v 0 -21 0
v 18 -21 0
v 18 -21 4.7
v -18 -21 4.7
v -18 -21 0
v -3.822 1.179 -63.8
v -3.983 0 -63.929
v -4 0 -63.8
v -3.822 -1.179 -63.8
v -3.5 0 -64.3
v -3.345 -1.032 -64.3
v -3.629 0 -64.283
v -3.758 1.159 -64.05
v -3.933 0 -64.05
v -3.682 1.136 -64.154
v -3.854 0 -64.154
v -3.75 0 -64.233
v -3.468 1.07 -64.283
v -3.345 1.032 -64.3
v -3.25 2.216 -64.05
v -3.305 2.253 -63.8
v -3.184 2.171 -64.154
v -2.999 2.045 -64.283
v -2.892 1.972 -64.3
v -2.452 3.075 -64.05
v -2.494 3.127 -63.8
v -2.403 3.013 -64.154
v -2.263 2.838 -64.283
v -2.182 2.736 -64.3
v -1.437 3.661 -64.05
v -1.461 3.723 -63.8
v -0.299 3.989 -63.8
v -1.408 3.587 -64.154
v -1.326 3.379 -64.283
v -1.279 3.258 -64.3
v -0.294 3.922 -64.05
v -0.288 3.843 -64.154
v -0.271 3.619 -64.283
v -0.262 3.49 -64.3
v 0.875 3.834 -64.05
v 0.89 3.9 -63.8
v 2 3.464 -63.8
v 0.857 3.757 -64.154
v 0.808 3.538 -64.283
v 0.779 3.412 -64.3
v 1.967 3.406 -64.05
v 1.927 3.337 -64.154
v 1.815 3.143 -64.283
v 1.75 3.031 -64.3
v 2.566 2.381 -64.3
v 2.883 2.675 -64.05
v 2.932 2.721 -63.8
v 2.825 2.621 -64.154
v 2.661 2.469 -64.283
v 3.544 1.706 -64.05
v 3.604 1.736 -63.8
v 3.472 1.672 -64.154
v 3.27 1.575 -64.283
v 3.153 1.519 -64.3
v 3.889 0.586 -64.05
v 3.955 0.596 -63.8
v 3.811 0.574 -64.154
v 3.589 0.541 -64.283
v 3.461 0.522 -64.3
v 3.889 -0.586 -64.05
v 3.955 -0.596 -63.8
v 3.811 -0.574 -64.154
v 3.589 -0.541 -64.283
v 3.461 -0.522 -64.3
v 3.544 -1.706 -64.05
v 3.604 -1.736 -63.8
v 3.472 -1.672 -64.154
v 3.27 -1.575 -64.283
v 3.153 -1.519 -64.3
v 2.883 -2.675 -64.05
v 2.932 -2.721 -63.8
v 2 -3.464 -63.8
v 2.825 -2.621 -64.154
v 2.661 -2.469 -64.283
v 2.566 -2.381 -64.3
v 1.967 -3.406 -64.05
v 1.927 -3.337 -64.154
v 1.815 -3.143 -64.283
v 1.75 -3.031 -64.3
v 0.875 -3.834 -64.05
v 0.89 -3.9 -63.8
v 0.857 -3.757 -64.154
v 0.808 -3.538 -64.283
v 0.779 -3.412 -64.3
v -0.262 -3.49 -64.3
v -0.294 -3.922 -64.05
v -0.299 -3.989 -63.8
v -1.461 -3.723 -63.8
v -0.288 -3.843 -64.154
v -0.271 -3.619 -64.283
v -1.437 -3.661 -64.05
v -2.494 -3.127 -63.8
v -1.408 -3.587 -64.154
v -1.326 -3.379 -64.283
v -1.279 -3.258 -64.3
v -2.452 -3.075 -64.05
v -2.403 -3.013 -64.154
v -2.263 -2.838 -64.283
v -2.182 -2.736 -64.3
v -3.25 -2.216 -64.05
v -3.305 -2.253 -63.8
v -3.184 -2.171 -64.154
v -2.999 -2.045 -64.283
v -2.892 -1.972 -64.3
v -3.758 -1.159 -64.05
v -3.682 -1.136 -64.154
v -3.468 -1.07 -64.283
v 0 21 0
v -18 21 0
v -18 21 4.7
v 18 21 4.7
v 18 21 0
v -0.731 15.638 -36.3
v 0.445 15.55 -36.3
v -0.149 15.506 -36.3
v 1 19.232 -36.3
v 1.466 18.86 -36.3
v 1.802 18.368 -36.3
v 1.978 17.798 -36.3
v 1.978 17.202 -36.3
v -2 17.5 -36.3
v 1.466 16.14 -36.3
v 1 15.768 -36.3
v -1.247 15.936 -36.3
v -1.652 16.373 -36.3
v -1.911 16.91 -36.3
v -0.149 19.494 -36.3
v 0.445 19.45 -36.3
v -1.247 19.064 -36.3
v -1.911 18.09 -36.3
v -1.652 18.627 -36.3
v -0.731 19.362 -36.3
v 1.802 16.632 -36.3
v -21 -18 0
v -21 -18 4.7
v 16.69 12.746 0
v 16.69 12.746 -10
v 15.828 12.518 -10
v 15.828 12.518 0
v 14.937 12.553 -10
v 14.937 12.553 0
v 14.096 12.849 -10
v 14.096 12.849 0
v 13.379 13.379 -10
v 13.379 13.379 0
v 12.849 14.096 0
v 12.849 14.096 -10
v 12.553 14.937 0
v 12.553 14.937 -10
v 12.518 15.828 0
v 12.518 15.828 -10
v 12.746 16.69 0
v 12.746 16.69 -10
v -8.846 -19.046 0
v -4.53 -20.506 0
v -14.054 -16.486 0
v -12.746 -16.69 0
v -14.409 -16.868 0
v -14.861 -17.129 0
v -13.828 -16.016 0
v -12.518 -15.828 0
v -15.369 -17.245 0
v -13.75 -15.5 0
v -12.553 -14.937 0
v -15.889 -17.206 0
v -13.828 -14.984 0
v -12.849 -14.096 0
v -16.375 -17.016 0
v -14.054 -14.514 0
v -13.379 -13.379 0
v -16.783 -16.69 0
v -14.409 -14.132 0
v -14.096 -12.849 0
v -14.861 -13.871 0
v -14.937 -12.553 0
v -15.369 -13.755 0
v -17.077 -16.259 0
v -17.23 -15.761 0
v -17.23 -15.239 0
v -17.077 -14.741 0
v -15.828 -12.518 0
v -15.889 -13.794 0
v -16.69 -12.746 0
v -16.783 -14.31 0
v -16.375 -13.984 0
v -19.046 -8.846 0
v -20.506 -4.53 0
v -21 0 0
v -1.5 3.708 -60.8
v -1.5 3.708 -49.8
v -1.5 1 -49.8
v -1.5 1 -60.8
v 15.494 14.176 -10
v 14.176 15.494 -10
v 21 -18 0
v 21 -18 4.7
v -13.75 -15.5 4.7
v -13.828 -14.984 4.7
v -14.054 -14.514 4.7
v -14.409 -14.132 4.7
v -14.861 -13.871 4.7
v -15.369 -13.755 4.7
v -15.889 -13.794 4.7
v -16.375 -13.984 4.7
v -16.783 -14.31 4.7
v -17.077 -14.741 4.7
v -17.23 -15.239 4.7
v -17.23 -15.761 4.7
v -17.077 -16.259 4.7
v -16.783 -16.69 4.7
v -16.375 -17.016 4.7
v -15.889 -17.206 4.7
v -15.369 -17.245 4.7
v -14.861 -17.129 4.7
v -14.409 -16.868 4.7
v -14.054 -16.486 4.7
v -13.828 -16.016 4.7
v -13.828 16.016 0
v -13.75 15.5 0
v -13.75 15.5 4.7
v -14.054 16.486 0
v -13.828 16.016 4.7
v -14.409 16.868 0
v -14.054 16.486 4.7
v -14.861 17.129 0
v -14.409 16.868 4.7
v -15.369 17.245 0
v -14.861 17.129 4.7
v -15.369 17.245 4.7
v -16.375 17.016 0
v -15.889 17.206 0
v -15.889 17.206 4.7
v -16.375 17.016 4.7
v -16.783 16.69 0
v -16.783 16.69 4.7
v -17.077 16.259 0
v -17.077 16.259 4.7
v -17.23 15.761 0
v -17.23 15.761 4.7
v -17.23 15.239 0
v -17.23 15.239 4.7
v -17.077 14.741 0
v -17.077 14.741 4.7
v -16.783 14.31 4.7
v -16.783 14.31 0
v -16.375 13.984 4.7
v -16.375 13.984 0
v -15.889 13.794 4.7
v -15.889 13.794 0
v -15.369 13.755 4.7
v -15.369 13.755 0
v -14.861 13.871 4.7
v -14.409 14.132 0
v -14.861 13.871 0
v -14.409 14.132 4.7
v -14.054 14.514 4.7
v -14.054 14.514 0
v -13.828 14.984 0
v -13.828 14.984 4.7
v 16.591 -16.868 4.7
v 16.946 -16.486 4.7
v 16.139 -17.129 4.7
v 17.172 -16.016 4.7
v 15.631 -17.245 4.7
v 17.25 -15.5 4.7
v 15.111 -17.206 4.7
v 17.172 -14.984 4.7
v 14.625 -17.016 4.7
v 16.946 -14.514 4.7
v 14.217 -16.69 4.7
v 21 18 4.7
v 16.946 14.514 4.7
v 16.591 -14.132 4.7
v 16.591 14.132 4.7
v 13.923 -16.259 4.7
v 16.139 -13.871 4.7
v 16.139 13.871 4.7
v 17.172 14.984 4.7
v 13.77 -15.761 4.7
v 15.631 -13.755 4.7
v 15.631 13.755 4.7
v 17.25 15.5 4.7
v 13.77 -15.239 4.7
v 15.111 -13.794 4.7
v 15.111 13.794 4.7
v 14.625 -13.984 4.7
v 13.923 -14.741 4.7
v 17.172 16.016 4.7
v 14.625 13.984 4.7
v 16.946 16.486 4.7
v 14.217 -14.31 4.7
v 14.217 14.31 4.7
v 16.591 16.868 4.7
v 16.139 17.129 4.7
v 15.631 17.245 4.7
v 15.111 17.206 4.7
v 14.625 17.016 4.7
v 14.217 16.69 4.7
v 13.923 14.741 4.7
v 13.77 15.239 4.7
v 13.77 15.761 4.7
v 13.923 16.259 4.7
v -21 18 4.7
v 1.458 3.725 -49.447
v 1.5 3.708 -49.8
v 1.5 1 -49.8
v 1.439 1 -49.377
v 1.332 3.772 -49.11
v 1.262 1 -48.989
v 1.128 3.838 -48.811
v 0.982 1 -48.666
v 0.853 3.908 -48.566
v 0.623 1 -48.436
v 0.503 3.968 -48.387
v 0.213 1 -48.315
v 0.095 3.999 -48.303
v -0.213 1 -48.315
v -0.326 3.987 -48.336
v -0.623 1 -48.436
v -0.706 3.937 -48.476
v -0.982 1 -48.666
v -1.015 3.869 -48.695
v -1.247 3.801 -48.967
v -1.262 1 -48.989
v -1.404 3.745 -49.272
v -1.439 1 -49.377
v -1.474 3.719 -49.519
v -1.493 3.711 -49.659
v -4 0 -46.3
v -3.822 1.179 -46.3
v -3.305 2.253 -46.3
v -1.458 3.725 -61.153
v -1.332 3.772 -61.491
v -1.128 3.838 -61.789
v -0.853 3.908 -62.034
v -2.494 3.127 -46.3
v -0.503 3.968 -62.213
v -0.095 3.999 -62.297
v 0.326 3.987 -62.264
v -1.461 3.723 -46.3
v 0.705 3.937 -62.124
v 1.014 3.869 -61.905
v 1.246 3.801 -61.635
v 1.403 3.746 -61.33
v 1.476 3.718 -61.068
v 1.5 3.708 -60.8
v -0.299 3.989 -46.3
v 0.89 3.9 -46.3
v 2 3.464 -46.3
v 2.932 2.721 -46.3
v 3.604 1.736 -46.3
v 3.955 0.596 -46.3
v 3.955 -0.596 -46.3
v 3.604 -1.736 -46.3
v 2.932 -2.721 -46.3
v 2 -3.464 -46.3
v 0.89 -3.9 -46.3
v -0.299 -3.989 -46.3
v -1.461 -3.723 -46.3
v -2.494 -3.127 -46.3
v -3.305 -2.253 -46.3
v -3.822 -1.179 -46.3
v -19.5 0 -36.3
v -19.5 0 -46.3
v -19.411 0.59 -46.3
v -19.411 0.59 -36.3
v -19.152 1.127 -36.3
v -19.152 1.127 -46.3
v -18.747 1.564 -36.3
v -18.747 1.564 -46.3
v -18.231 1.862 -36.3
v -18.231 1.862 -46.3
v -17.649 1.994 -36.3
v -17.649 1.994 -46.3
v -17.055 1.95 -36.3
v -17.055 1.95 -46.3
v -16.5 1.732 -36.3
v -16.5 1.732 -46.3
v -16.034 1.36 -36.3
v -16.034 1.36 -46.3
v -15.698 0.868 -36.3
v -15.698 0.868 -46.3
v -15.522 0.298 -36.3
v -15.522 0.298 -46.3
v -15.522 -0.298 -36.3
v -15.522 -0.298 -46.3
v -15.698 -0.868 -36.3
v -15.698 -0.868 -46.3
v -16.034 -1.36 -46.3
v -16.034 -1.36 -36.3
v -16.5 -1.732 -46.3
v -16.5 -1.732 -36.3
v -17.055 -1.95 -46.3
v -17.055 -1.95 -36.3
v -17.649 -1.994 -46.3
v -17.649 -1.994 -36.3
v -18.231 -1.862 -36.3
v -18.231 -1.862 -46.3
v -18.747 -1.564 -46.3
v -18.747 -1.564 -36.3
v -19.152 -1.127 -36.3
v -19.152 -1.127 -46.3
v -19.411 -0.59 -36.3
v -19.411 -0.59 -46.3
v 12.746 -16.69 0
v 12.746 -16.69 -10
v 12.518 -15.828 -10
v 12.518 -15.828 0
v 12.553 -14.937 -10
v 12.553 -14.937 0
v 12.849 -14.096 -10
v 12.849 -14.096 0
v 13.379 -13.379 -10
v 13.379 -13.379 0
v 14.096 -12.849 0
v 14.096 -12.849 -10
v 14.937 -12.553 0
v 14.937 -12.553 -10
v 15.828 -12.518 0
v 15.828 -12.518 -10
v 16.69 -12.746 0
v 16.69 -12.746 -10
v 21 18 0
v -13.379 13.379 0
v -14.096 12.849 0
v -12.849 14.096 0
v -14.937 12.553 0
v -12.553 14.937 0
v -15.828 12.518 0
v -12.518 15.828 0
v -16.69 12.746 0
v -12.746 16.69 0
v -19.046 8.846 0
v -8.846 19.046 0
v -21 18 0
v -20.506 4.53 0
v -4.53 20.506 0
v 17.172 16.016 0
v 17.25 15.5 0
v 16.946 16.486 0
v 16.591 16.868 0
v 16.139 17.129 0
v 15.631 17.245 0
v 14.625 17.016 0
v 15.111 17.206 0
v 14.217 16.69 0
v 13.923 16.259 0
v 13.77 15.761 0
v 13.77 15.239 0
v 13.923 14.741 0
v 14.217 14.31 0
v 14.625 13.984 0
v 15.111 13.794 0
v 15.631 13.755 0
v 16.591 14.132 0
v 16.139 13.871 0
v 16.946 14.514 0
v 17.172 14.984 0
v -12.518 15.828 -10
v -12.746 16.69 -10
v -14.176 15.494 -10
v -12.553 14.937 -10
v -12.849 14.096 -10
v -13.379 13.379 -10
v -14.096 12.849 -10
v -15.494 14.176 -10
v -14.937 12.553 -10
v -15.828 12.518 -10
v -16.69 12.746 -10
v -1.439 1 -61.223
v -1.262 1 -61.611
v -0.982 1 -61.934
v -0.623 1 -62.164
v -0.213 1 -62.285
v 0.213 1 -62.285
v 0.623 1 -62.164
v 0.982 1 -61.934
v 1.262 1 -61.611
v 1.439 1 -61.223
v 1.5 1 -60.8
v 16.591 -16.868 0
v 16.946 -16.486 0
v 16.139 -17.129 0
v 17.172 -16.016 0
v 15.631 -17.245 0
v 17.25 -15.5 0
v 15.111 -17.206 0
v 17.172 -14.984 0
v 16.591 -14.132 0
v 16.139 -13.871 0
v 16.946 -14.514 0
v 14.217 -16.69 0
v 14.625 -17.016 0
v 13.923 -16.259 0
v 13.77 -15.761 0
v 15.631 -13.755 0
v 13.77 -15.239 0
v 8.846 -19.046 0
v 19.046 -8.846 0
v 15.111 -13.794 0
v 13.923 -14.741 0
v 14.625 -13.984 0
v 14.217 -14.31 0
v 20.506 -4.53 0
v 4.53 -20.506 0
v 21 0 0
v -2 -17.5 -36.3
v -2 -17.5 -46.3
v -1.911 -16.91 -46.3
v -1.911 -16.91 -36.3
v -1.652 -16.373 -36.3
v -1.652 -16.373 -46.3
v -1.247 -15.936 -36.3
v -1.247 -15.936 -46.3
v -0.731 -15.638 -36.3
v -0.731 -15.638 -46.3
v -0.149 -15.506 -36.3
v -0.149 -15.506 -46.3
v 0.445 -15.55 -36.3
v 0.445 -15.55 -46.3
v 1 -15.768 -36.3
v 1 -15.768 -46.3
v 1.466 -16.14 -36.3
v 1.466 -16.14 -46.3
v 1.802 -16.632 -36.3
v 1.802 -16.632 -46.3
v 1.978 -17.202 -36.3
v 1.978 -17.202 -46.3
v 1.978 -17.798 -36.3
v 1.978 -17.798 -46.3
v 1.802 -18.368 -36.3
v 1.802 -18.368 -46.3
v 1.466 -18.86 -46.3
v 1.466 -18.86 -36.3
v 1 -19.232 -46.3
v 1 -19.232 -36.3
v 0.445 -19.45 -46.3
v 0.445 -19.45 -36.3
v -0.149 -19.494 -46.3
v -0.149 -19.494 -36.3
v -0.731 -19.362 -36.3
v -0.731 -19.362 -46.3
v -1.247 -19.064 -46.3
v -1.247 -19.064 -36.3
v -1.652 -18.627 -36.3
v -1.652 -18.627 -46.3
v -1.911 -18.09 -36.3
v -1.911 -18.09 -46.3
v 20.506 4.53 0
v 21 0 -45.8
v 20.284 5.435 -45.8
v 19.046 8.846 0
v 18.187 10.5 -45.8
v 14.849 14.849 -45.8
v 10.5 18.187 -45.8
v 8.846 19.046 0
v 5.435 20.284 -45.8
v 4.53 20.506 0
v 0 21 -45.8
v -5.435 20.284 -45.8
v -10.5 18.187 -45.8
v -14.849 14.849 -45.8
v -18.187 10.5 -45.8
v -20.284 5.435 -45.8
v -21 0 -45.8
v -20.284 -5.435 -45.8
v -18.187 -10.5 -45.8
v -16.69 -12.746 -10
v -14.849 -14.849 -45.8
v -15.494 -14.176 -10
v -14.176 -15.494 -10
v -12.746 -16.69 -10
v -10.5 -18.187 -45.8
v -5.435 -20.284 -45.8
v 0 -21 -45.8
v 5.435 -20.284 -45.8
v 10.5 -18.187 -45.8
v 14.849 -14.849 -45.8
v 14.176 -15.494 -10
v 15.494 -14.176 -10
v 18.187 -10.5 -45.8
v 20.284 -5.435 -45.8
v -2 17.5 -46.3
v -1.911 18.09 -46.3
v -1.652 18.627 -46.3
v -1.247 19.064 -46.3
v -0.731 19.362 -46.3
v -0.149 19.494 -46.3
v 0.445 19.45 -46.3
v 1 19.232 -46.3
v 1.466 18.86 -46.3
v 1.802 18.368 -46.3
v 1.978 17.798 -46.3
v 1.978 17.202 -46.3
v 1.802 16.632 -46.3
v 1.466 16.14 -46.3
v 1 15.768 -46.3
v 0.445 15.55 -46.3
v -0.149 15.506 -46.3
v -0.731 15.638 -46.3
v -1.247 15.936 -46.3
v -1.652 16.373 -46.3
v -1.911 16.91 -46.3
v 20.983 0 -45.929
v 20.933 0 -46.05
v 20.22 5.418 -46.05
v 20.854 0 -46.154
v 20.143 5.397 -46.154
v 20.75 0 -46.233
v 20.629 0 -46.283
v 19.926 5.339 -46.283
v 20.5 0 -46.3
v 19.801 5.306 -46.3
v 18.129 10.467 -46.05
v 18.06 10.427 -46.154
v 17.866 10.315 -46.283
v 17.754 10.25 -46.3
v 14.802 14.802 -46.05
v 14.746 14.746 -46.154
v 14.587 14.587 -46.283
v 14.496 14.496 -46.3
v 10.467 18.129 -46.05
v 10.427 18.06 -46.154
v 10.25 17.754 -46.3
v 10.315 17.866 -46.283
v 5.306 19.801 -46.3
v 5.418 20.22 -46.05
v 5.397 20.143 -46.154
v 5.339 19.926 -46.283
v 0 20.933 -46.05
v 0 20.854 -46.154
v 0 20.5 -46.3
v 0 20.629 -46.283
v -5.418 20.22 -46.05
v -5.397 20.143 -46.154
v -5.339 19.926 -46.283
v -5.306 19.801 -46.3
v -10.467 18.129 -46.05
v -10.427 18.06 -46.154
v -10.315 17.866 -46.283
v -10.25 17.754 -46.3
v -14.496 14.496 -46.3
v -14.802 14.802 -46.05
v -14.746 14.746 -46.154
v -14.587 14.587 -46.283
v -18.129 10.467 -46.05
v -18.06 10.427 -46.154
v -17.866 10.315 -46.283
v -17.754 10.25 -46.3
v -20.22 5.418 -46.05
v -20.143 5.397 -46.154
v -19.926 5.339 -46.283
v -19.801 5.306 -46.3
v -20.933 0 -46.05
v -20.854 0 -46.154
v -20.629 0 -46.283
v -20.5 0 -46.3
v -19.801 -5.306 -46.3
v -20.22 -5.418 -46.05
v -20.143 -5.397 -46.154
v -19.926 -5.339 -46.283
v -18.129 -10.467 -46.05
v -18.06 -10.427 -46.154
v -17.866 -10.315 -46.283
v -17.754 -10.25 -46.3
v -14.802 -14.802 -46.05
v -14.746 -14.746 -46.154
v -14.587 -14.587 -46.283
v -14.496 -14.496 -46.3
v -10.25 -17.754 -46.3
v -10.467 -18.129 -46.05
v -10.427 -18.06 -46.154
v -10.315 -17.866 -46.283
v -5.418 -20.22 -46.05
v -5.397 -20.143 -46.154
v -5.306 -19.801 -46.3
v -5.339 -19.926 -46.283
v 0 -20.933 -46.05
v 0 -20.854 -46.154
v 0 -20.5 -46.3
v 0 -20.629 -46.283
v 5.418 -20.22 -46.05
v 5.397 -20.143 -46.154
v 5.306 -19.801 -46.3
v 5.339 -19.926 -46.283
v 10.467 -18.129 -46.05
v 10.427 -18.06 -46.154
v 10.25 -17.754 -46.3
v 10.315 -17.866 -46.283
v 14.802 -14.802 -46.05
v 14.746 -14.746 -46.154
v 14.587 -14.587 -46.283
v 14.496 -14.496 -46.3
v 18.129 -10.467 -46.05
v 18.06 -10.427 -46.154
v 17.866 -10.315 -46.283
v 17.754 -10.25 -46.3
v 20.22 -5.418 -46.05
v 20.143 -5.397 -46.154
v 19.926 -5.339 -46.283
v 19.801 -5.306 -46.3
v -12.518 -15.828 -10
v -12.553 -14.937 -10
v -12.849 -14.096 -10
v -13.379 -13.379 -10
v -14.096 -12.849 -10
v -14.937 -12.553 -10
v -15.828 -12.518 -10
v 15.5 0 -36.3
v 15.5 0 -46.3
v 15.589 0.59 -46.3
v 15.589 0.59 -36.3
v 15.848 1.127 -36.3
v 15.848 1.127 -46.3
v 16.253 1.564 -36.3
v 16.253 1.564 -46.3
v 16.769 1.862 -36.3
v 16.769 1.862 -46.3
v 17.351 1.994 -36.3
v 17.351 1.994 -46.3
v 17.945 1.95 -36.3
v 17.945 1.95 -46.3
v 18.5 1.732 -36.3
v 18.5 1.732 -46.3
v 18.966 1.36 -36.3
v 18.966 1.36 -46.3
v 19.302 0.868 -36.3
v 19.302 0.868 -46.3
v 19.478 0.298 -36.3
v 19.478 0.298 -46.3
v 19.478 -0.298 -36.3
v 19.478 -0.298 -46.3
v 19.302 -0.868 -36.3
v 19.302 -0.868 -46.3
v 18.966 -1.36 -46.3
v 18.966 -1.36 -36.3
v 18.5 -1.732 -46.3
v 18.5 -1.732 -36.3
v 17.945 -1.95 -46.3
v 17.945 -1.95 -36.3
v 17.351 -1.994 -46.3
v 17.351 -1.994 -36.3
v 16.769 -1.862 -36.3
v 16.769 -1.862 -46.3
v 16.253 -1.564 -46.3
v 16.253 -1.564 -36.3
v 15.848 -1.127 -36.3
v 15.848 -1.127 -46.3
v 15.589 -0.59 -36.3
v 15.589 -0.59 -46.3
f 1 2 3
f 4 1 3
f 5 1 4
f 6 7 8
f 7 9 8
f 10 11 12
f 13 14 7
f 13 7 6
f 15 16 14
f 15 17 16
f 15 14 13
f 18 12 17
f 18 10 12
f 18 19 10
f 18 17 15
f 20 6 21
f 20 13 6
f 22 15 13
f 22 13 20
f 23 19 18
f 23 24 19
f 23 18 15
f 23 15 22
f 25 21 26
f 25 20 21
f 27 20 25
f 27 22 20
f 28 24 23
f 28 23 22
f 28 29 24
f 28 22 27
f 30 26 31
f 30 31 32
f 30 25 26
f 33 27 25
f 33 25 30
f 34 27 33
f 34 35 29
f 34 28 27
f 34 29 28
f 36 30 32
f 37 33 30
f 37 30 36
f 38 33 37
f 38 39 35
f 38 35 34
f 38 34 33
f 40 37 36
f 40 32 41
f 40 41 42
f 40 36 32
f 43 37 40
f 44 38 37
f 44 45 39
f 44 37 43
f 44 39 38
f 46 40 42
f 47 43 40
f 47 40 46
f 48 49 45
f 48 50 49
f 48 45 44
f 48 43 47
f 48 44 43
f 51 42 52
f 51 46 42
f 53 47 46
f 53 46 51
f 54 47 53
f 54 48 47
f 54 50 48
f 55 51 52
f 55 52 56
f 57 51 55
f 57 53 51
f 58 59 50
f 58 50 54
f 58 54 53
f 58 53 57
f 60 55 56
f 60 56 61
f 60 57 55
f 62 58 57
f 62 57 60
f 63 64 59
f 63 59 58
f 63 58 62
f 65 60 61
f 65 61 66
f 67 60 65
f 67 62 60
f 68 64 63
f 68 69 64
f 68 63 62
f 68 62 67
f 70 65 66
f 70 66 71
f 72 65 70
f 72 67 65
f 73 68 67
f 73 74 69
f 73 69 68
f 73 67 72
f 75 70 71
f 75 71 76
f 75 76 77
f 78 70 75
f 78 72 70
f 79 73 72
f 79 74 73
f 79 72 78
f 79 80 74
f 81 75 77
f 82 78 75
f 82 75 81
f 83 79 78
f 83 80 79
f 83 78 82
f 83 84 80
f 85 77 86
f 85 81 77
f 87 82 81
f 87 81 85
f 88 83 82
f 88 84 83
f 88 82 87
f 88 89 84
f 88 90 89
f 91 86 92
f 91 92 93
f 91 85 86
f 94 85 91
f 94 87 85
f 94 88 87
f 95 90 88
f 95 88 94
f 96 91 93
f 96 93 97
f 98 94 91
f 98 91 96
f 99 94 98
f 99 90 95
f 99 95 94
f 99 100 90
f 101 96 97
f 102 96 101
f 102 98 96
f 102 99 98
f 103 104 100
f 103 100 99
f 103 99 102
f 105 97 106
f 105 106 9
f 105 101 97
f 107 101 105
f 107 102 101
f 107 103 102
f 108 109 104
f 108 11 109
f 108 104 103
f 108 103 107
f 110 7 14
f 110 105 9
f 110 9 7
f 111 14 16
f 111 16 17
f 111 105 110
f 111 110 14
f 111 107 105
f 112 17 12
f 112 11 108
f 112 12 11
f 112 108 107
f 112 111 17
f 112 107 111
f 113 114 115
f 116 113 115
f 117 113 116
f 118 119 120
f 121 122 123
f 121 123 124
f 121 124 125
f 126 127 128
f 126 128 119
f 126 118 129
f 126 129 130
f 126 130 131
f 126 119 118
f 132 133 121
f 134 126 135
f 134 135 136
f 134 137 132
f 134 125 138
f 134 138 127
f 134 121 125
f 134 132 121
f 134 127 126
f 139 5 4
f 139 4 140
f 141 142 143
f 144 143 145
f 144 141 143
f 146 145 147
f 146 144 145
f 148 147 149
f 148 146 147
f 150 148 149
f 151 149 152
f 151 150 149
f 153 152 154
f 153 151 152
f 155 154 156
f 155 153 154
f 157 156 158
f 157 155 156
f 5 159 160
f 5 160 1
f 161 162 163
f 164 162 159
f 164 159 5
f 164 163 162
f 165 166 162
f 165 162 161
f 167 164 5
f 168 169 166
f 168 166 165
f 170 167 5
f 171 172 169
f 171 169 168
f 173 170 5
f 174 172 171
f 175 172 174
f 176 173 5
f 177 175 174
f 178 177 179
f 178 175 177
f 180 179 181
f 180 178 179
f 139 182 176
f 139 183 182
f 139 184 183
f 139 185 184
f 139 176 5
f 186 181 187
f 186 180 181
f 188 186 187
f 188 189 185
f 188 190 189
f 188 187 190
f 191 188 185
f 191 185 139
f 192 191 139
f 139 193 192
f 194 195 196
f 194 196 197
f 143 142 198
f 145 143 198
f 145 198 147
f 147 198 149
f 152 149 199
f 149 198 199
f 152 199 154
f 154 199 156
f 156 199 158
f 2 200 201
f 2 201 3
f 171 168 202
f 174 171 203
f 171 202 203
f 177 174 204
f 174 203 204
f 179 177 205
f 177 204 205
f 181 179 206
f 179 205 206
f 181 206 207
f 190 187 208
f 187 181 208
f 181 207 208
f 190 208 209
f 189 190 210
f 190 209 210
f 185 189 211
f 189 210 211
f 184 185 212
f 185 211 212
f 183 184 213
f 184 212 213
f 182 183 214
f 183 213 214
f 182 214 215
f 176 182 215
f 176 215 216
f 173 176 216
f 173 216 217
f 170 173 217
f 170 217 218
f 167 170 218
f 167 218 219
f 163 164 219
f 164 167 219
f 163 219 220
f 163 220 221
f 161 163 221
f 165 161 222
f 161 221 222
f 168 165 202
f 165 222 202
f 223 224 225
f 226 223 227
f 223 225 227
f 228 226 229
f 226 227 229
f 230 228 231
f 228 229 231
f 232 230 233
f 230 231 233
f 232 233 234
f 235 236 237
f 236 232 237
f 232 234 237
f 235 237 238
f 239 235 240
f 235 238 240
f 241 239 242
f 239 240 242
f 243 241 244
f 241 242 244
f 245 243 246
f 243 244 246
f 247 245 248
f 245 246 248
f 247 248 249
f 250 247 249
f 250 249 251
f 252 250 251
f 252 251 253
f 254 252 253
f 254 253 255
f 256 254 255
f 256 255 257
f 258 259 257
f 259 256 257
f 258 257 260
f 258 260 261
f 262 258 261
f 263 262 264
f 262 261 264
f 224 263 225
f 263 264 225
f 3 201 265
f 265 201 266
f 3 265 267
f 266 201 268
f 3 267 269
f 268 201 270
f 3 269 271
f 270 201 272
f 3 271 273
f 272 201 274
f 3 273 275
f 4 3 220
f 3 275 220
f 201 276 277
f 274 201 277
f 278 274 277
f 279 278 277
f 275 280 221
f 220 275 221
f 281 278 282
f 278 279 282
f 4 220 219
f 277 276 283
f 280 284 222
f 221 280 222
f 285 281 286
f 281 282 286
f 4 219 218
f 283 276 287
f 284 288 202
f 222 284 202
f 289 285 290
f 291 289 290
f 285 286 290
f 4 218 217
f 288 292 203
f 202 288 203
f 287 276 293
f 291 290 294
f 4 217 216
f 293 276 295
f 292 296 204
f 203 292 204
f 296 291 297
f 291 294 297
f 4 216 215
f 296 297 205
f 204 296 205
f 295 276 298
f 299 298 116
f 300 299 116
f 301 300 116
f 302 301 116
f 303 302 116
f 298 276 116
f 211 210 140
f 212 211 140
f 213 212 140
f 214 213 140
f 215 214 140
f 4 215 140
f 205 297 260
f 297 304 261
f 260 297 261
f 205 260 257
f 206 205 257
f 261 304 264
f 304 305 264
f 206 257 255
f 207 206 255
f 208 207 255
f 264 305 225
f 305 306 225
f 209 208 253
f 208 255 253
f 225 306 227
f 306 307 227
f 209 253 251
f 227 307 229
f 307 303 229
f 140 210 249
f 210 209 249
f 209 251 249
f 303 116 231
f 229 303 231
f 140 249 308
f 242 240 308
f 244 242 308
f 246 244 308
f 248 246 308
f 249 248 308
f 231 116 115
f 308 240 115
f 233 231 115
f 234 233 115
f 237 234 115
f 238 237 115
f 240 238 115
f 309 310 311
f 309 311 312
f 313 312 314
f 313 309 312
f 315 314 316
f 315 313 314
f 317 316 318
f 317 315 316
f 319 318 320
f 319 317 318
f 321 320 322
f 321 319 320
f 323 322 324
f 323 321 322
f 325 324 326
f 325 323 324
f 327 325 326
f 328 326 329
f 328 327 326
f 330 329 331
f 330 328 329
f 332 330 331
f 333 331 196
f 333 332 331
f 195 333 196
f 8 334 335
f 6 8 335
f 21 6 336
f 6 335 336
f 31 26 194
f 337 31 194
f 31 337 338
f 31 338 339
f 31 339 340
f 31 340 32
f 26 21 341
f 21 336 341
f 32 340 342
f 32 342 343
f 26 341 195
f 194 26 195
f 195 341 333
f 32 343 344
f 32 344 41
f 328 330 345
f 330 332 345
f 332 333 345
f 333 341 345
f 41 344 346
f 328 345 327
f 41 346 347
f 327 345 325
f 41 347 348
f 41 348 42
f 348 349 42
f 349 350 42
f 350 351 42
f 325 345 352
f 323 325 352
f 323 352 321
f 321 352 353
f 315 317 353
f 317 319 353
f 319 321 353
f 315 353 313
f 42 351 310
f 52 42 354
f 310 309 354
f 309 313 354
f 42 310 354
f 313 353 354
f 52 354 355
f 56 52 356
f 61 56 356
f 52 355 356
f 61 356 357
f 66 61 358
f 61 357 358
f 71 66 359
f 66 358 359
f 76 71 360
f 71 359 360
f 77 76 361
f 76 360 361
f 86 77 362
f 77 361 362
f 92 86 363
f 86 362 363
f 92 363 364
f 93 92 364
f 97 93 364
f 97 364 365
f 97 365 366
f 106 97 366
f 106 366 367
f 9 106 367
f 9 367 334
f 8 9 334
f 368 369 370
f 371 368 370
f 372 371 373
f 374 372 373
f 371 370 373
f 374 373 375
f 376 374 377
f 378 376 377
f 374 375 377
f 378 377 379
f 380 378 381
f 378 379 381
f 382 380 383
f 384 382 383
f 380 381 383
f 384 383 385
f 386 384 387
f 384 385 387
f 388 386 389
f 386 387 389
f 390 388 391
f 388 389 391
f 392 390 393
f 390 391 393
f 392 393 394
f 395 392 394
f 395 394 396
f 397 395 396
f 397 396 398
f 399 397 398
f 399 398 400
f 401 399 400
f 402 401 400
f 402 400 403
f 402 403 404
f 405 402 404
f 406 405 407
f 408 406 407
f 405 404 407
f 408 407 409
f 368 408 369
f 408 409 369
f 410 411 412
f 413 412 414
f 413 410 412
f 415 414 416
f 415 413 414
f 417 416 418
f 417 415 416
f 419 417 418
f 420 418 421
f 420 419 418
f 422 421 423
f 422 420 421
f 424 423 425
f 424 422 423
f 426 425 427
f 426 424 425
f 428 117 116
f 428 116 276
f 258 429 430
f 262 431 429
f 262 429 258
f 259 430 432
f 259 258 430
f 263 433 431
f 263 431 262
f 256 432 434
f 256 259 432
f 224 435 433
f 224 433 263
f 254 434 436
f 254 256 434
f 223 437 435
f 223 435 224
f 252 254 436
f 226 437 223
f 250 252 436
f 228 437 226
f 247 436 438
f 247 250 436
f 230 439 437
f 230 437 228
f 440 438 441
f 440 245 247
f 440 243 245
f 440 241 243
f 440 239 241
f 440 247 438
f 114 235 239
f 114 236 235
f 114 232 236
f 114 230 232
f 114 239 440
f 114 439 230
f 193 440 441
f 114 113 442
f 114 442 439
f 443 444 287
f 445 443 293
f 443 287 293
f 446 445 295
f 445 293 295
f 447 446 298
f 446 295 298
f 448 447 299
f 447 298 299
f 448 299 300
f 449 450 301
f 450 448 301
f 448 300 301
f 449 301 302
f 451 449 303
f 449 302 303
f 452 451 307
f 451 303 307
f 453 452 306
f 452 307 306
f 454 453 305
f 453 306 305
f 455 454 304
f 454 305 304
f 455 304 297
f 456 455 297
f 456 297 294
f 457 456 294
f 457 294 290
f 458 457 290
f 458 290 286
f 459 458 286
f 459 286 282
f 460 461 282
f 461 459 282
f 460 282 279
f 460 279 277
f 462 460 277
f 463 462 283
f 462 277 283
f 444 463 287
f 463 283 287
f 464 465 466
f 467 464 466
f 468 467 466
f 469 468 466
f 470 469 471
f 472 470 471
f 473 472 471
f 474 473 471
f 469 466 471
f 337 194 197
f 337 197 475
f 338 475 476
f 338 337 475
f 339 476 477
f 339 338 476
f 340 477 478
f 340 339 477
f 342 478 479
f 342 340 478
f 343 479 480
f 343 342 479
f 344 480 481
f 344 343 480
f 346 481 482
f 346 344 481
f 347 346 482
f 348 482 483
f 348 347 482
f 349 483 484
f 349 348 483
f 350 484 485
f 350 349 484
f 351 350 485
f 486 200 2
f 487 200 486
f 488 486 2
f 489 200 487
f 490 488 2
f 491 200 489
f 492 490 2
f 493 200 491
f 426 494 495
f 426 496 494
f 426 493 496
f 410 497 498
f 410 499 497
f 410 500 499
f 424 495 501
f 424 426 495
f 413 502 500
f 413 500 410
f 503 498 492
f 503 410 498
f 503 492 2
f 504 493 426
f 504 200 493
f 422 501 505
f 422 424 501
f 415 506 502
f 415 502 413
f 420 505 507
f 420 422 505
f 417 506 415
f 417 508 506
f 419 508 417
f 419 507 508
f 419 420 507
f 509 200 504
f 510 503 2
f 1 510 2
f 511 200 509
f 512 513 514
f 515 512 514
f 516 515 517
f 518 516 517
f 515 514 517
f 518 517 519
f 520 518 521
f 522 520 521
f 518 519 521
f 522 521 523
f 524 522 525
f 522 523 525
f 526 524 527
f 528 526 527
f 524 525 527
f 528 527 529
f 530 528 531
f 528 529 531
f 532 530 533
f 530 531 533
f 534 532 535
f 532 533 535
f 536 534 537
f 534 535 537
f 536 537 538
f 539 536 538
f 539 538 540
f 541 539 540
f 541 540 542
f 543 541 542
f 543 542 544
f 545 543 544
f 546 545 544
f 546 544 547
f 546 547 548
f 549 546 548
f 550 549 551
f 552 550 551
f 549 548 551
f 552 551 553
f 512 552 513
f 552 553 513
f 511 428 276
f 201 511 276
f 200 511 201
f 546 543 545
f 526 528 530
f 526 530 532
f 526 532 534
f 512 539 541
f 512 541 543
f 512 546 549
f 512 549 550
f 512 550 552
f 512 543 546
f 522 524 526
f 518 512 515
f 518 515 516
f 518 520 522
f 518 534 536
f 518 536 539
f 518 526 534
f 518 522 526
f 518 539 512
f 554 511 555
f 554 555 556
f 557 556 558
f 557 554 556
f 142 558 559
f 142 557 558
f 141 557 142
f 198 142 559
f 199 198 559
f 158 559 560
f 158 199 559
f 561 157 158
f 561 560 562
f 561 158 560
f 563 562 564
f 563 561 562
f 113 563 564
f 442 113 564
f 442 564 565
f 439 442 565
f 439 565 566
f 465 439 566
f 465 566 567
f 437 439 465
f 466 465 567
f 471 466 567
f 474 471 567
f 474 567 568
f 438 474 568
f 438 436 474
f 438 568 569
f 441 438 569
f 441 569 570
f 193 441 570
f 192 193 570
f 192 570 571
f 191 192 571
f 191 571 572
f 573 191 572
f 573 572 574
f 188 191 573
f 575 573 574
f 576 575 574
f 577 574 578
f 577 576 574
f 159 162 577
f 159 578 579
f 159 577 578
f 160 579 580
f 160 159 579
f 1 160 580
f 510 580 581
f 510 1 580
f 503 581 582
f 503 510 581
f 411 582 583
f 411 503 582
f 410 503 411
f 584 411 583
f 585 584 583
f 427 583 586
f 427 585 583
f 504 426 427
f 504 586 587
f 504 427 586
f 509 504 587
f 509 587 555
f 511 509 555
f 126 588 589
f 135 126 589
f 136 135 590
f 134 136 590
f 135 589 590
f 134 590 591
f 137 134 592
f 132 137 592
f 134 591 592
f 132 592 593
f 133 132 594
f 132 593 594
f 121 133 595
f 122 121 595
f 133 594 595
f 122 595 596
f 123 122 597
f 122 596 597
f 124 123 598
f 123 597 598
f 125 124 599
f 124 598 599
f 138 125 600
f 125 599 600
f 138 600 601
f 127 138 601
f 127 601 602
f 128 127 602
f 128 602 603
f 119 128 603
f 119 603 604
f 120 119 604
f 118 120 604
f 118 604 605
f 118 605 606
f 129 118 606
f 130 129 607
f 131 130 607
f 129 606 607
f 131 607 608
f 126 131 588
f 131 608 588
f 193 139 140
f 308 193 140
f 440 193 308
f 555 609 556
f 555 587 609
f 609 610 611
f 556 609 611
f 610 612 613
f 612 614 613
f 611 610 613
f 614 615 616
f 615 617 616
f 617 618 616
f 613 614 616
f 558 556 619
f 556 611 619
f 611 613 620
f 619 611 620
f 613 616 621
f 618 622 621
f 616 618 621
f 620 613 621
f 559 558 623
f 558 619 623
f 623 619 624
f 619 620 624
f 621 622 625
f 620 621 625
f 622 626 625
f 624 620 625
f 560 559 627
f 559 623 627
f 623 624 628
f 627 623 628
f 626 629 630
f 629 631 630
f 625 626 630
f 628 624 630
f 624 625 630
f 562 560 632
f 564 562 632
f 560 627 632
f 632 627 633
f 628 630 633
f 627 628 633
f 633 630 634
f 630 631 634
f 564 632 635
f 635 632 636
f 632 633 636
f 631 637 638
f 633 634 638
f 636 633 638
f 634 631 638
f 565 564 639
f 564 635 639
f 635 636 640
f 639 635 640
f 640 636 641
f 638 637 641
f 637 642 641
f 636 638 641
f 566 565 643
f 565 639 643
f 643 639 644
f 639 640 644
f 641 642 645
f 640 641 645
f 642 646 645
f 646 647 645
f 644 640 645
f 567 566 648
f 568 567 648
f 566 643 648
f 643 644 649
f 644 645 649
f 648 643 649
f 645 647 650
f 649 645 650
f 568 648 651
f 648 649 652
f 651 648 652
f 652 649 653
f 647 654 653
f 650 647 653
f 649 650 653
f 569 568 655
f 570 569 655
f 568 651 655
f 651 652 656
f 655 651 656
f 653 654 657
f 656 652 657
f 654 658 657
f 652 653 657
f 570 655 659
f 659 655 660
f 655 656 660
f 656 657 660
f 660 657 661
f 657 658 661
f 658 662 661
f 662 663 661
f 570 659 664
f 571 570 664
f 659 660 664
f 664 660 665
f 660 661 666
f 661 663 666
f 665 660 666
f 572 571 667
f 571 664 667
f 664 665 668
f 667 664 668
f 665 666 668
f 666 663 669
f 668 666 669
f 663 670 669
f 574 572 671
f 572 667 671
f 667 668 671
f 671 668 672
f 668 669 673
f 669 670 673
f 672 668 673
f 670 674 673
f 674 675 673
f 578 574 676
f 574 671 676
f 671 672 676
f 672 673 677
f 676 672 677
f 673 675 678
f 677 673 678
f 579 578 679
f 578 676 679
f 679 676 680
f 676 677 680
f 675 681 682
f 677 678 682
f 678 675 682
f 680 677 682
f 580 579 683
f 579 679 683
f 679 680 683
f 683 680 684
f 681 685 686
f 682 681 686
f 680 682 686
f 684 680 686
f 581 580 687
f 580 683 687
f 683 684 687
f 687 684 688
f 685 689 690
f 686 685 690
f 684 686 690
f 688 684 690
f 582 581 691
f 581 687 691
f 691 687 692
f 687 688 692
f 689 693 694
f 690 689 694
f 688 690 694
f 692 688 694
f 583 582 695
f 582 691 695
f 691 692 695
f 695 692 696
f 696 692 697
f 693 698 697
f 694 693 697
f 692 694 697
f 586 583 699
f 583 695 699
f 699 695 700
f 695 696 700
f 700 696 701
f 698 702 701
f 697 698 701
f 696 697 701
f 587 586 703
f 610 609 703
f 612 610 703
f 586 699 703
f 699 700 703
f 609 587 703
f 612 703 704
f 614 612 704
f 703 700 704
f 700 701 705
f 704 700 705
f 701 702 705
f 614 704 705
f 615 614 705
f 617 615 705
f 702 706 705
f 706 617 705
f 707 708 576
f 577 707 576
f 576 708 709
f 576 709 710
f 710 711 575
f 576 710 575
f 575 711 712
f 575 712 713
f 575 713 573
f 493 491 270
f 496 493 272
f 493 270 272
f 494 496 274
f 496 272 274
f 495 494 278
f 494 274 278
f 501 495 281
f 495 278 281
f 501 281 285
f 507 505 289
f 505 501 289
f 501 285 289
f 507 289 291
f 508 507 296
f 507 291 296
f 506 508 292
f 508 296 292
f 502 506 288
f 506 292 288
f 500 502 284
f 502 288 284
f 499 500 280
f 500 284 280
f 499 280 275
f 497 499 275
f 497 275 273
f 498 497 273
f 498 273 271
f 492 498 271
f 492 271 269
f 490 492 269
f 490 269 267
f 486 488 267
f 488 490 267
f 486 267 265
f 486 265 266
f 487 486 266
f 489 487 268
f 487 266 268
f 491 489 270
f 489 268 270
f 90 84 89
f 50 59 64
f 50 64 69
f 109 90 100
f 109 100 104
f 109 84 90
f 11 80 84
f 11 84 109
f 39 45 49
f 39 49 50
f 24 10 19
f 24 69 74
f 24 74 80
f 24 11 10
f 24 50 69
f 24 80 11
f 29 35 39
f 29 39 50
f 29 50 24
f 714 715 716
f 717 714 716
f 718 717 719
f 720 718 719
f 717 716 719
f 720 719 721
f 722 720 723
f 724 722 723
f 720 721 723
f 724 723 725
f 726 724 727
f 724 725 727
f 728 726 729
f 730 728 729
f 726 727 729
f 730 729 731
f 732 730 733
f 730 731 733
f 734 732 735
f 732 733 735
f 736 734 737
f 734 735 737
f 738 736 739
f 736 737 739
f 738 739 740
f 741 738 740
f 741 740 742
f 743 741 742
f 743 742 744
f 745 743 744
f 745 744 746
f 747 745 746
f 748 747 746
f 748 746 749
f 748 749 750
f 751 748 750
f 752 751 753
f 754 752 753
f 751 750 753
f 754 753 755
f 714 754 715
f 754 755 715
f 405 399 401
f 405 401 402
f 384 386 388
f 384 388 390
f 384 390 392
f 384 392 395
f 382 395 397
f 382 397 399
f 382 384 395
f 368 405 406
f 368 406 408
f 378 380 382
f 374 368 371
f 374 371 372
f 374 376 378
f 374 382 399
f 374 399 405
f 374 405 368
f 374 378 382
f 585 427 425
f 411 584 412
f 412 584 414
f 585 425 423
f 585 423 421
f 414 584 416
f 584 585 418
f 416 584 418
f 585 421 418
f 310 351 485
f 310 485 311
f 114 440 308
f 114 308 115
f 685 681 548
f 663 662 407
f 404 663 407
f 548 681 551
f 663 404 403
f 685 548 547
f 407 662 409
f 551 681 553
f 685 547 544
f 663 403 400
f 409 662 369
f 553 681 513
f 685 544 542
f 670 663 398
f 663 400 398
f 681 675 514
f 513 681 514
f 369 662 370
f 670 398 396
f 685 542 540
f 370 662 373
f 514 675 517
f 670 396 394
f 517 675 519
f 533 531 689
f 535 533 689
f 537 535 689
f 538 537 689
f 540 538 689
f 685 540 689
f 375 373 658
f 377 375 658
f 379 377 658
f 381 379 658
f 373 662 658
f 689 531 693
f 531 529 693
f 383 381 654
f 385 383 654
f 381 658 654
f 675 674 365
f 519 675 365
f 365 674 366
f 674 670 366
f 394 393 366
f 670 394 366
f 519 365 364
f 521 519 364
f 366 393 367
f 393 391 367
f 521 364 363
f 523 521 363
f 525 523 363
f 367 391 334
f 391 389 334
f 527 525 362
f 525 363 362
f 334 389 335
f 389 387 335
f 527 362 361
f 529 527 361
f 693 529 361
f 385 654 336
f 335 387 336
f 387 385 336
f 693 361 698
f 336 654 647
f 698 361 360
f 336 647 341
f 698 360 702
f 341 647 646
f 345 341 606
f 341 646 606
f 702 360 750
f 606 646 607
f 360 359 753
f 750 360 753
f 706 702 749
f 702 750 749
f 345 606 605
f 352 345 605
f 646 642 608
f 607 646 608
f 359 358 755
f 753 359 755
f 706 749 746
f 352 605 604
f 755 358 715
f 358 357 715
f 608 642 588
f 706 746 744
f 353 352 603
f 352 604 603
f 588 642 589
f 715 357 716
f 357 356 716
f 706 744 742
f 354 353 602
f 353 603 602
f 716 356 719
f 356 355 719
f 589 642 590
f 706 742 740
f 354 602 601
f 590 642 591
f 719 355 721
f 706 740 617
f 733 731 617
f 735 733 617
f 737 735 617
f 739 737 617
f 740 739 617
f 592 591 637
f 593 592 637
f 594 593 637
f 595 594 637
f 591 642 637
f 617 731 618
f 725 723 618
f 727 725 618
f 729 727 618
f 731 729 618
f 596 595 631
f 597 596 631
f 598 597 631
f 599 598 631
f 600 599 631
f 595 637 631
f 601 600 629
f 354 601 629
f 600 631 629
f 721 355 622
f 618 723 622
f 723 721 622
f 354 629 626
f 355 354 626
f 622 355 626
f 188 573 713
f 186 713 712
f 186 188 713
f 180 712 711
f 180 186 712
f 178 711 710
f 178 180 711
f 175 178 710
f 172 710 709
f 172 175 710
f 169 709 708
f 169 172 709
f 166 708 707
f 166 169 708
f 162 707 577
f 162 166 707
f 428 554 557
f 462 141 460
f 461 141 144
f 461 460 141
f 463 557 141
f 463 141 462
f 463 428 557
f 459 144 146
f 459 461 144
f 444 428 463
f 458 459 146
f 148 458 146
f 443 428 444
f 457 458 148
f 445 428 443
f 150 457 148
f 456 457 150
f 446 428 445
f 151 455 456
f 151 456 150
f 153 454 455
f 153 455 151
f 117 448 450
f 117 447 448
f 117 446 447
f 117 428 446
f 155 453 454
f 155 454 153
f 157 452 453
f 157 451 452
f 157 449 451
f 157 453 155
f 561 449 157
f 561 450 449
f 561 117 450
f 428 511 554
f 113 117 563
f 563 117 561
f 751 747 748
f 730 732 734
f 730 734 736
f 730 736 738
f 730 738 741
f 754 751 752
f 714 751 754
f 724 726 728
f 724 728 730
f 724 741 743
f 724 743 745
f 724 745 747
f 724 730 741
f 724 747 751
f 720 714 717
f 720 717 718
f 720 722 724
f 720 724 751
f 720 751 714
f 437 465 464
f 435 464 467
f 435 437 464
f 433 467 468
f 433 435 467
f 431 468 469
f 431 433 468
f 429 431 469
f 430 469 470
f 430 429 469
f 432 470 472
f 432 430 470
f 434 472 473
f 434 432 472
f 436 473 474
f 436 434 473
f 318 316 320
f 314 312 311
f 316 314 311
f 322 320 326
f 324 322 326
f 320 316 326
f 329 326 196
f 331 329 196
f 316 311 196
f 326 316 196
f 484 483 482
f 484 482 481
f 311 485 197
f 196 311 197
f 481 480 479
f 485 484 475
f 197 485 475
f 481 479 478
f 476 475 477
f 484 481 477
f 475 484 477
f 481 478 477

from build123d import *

# Parameters (mm, degrees)
BOSS_EXTRUDE1_DEPTH = 4.7
SKETCH2_R           = 21
BOSS_EXTRUDE2_DEPTH = 51
SKETCH3_R           = 4
BOSS_EXTRUDE3_DEPTH = 18
SKETCH5_R           = 1.75
CUT_EXTRUDE1_DEPTH  = 10
SKETCH6_R           = 3
CUT_EXTRUDE2_DEPTH  = 10
CUT_EXTRUDE3_DEPTH  = 3
FILLET1_R           = 0.5
SKETCH8_R           = 2
CUT_EXTRUDE4_DEPTH  = 10


with BuildPart() as part:
    # Sketch1 → Boss-Extrude1 (new body)
    with BuildSketch(Plane.XY):
        Polygon((-21, 18), (-18, 21), (18, 21), (21, 18), (21, -18), (18, -21), (-18, -21), (-21, -18), align=None)
    extrude(amount=BOSS_EXTRUDE1_DEPTH)

    # Sketch2 → Boss-Extrude2 (add)
    with BuildSketch(Plane.XY.offset(4.7)):
        Circle(SKETCH2_R)
    extrude(amount=-BOSS_EXTRUDE2_DEPTH)

    # Sketch3 → Boss-Extrude3 (add)
    with BuildSketch(Plane(origin=(0, 0, -46.3), x_dir=(-1, 0, 0), z_dir=(0, 0, -1))):
        Circle(SKETCH3_R)
    extrude(amount=BOSS_EXTRUDE3_DEPTH)

    # Sketch5 → Cut-Extrude1 (cut)
    with BuildSketch(Plane.XY.offset(4.7)):
        with Locations((-15.5, 15.5)):
            Circle(SKETCH5_R)
        with Locations((15.5, 15.5)):
            Circle(SKETCH5_R)
        with Locations((-15.5, -15.5)):
            Circle(SKETCH5_R)
        with Locations((15.5, -15.5)):
            Circle(SKETCH5_R)
    extrude(amount=-CUT_EXTRUDE1_DEPTH, mode=Mode.SUBTRACT)

    # Sketch6 → Cut-Extrude2 (cut)
    with BuildSketch(Plane(origin=(0, 0, 0), x_dir=(-1, 0, 0), z_dir=(0, 0, -1))):
        with Locations((-15.5, 15.5)):
            Circle(SKETCH6_R)
        with Locations((-15.5, -15.5)):
            Circle(SKETCH6_R)
        with Locations((15.5, -15.5)):
            Circle(SKETCH6_R)
        with Locations((15.5, 15.5)):
            Circle(SKETCH6_R)
    extrude(amount=CUT_EXTRUDE2_DEPTH, mode=Mode.SUBTRACT)

    # Sketch7 → Cut-Extrude3 (cut)
    with BuildSketch(Plane(origin=(0, 4, 0), x_dir=(1, 0, 0), z_dir=(0, 1, 0))):
        with BuildLine():
            Line((1.5, 60.8), (1.5, 49.8))
            ThreePointArc((1.5, 49.8), (0, 48.3), (-1.5, 49.8))
            Line((-1.5, 49.8), (-1.5, 60.8))
            ThreePointArc((-1.5, 60.8), (0, 62.3), (1.5, 60.8))
        make_face()
    extrude(amount=-CUT_EXTRUDE3_DEPTH, mode=Mode.SUBTRACT)

    # Fillet1
    fillet1_edges = [part.edges().sort_by_distance(p)[0] for p in [
        (-21, 0, -46.3),
        (4, 0, -64.3),
    ]]
    fillet(fillet1_edges, radius=FILLET1_R)

    # Sketch8 → Cut-Extrude4 (cut)
    with BuildSketch(Plane(origin=(0, 0, -46.3), x_dir=(-1, 0, 0), z_dir=(0, 0, -1))):
        with Locations((0, 17.5)):
            Circle(SKETCH8_R)
        with Locations((-17.5, 0)):
            Circle(SKETCH8_R)
        with Locations((0, -17.5)):
            Circle(SKETCH8_R)
        with Locations((17.5, 0)):
            Circle(SKETCH8_R)
    extrude(amount=-CUT_EXTRUDE4_DEPTH, mode=Mode.SUBTRACT)


solid = part.part
